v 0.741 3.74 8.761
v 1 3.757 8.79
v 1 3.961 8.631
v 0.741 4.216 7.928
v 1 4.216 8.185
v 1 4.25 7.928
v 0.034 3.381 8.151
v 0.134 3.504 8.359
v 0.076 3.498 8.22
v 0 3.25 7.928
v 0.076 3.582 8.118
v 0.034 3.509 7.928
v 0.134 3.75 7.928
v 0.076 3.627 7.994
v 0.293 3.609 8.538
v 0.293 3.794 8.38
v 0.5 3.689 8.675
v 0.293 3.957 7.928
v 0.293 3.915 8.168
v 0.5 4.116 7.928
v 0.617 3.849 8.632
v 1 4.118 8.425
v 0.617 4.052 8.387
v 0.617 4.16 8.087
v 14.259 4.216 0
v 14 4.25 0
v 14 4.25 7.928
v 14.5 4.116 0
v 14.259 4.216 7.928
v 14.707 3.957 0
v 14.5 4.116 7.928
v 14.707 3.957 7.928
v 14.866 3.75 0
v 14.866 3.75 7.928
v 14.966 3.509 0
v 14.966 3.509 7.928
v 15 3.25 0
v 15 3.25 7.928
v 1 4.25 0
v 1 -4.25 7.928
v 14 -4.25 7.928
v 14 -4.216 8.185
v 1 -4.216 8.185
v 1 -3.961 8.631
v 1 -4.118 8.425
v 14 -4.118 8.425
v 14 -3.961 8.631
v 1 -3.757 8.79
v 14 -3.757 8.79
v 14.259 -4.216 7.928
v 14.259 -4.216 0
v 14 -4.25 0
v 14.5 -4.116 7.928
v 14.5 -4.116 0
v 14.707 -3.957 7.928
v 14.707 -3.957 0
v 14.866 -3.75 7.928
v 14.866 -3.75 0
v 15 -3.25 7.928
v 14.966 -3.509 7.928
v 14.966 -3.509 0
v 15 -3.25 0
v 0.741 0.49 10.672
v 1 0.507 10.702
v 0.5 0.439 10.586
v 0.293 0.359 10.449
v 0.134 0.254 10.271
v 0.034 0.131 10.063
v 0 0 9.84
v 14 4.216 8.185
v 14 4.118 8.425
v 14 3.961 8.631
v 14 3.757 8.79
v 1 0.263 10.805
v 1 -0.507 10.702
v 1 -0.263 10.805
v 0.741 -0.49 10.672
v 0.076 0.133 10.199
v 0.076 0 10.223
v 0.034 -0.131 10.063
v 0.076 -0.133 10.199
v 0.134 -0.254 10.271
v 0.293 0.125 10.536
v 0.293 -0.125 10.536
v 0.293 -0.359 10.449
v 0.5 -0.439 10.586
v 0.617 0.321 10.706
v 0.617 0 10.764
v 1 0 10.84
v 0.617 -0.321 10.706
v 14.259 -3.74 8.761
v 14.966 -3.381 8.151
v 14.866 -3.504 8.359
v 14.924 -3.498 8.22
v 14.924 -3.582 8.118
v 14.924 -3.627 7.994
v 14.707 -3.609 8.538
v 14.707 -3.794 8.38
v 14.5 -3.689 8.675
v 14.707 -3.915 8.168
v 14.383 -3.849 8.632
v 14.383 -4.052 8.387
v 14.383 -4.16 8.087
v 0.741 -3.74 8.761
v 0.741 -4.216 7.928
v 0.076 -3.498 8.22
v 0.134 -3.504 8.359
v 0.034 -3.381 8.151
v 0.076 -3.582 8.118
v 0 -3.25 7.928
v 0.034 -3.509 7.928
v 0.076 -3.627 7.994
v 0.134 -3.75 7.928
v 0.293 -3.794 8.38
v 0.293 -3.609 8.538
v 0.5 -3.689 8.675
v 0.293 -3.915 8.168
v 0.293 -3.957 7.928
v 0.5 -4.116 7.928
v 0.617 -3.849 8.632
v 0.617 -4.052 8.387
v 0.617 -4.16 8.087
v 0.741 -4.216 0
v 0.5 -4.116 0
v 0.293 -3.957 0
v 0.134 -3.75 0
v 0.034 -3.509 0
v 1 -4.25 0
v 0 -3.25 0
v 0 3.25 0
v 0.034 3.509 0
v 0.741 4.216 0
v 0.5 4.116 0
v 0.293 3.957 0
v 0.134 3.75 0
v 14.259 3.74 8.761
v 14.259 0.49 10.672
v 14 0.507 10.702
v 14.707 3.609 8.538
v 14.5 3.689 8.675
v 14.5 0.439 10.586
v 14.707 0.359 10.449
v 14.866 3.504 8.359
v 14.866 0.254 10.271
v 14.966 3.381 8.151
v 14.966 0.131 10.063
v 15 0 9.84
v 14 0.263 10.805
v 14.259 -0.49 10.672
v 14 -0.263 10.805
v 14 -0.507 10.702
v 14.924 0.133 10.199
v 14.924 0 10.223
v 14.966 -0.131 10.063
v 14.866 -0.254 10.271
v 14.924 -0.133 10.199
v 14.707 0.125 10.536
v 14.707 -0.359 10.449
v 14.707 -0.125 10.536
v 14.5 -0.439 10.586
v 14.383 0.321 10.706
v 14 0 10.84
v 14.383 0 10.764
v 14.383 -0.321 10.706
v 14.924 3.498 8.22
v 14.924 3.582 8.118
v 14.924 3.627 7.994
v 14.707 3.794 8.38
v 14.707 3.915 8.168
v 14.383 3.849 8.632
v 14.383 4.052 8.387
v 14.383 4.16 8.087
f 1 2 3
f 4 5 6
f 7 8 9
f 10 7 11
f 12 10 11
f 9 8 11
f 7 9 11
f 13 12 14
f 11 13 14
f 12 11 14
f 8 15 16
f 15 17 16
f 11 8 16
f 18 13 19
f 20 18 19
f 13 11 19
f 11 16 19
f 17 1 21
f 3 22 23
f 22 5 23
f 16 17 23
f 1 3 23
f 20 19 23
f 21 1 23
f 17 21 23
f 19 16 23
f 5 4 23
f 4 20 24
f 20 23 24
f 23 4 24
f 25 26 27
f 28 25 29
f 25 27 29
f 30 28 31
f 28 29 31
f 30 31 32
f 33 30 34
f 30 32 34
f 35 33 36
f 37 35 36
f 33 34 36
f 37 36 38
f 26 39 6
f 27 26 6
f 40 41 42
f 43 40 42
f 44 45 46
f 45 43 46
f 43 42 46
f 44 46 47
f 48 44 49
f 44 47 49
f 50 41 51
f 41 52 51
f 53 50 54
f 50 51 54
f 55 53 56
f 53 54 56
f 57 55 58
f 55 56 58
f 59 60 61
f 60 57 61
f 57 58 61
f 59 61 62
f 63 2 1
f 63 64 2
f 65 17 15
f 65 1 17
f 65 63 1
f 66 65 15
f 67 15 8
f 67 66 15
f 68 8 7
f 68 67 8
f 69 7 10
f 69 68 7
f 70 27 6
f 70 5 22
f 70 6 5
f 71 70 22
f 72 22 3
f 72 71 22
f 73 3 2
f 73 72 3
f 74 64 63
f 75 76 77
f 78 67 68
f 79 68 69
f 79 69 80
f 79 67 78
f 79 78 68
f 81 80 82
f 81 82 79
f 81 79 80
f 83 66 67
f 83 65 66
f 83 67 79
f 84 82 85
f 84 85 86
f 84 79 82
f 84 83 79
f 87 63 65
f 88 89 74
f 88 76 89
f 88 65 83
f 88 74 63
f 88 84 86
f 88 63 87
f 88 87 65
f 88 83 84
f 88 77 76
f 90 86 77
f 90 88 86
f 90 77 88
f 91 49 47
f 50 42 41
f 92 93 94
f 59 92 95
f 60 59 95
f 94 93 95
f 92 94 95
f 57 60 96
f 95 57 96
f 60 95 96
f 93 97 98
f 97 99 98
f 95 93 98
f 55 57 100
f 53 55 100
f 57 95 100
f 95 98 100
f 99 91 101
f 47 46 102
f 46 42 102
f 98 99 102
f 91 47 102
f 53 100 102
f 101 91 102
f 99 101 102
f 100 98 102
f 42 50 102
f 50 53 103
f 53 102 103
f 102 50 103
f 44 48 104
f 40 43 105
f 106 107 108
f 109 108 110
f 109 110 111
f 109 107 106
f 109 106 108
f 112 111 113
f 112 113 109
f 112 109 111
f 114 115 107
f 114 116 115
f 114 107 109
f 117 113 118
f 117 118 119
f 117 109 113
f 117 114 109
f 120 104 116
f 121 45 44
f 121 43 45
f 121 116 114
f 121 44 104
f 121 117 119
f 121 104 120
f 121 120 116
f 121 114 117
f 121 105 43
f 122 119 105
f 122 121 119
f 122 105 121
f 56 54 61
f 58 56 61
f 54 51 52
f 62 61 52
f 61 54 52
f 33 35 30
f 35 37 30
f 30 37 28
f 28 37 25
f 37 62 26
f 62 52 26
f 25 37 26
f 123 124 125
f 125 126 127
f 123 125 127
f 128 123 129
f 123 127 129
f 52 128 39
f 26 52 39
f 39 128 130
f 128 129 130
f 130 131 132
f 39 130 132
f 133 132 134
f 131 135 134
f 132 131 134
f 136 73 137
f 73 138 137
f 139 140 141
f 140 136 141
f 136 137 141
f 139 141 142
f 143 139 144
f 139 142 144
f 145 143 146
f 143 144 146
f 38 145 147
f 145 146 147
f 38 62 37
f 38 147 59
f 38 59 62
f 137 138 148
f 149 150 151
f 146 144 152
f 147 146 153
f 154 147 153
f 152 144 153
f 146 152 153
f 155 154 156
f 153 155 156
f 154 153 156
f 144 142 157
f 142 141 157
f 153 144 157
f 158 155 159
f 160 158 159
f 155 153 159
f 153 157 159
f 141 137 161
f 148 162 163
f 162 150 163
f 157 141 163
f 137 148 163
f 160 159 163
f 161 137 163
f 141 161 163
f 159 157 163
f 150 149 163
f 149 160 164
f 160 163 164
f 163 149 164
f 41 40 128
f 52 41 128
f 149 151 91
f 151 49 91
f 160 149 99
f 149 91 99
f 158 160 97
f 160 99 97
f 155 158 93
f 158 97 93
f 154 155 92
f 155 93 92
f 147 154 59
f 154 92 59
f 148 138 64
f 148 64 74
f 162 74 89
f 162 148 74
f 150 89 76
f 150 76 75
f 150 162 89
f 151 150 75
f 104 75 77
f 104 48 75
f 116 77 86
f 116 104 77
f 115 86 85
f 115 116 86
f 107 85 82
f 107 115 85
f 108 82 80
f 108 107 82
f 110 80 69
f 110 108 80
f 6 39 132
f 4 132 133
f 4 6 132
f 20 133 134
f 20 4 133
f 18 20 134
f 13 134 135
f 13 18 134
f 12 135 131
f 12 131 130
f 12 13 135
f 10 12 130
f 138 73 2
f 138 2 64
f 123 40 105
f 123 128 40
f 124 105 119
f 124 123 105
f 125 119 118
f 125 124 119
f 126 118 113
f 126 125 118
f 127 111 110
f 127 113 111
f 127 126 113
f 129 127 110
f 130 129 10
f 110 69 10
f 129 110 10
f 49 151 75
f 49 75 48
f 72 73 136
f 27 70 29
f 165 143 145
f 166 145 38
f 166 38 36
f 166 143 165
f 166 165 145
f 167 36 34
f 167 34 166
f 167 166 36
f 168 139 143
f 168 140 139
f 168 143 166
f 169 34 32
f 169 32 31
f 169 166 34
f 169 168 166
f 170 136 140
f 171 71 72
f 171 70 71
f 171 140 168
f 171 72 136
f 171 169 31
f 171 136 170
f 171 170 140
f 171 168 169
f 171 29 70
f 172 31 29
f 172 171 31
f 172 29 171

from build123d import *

# Parameters (mm, degrees)
F1_DEPTH = 15
F2_R     = 1


with BuildPart() as f1:
    # F0 (on Right) → F1 (new body)
    with BuildSketch(Plane.YZ):
        Polygon((-4.25, 8.5), (-4.25, 0), (0, 0), (4.25, 0), (4.25, 8.5), (0, 11), align=None)
    extrude(amount=F1_DEPTH)

    # F2
    f2_edges = [f1.edges().sort_by_distance(p)[0] for p in [
        (7.5, -4.25, 8.5),
        (7.5, 0, 11),
        (7.5, 4.25, 8.5),
        (15, 2.125, 9.75),
        (15, -2.125, 9.75),
        (0, 2.125, 9.75),
        (0, -2.125, 9.75),
        (0, -4.25, 4.25),
        (0, 4.25, 4.25),
        (15, -4.25, 4.25),
        (15, 4.25, 4.25),
    ]]
    fillet(f2_edges, radius=F2_R)


solid = f1.part
